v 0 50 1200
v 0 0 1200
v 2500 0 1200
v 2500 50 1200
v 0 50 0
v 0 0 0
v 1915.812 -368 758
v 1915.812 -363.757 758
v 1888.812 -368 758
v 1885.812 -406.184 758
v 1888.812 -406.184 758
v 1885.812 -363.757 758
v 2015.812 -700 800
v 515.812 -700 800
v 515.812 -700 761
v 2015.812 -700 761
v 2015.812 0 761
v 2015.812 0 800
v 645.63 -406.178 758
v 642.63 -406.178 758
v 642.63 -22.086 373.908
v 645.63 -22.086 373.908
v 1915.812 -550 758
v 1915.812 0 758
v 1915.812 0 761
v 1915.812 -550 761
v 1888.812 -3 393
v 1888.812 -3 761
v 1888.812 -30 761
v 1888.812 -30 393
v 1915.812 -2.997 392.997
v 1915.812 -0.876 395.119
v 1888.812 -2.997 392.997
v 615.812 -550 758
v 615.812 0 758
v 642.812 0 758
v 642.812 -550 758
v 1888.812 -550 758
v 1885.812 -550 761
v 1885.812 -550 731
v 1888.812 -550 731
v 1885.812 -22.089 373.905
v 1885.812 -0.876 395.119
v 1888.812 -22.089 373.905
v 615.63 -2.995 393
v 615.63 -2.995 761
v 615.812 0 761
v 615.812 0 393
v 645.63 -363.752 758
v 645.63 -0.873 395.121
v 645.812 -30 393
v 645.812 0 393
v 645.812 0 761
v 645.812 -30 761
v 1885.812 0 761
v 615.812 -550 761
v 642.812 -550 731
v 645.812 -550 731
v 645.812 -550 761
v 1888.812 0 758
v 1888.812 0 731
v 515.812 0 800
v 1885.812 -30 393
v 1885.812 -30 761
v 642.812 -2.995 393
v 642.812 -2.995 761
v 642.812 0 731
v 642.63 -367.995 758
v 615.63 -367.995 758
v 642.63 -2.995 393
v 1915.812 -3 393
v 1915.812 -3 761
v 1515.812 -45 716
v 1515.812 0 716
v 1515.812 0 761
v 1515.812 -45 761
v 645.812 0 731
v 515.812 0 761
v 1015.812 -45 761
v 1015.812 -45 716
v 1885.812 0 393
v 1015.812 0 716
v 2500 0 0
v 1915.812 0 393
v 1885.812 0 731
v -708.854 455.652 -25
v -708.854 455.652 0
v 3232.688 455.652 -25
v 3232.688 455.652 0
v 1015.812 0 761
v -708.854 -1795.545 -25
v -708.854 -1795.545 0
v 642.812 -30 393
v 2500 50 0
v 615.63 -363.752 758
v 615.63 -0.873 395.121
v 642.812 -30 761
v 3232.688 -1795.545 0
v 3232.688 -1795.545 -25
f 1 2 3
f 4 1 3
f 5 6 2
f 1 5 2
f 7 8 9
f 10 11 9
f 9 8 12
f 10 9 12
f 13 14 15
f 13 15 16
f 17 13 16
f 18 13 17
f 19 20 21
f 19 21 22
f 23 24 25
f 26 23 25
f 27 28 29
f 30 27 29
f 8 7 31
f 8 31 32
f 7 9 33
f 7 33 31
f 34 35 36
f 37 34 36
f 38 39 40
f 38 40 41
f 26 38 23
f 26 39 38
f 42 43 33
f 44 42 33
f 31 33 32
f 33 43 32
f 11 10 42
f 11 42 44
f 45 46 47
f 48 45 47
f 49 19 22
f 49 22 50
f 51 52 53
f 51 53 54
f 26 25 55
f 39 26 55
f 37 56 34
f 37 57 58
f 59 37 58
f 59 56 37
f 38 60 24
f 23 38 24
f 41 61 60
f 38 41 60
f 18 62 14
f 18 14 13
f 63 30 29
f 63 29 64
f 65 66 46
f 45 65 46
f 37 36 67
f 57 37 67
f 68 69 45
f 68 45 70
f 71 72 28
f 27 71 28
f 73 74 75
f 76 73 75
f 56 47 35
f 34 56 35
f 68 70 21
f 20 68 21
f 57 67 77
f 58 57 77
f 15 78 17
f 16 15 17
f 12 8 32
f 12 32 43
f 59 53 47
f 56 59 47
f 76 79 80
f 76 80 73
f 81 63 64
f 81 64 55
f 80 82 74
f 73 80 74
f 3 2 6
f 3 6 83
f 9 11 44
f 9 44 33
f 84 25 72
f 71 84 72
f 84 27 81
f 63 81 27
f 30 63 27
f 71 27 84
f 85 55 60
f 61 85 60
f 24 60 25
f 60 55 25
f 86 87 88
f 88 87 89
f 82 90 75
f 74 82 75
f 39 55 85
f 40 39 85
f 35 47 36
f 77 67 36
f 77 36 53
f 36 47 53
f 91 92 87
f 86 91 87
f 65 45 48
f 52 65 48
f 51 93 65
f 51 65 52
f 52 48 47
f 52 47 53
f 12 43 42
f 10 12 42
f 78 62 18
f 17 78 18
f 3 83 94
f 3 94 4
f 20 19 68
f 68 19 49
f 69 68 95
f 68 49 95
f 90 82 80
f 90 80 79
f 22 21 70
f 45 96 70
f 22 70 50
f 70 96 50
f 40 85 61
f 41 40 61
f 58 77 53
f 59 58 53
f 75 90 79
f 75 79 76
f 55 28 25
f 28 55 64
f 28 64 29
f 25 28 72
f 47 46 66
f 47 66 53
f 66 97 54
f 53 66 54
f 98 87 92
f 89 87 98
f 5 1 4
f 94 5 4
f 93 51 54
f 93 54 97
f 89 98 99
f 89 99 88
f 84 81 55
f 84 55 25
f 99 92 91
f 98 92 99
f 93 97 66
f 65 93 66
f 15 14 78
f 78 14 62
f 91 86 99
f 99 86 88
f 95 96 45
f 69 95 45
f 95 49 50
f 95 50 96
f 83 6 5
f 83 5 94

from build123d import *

# Parameters (mm, degrees)
F0_W      = 2500
F0_H      = 1200
F1_DEPTH  = 50
F2_W      = 3941.5423870087
F2_H      = 2251.1970996857
F3_DEPTH  = 25
F5_W      = 1500
F5_H      = 700
F6_DEPTH  = 39
F7_W      = 500
F7_H      = 45
F8_DEPTH  = 45
F10_DEPTH = 550
F12_DEPTH = 368
F15_REACH = 1880.5875140627


with BuildPart() as f1:
    # F0 (on Front) → F1 (new body)
    with BuildSketch(Plane.XZ):
        with Locations((1250, 600)):
            Rectangle(F0_W, F0_H)
    extrude(amount=-F1_DEPTH)


with BuildPart() as f3:
    # F2 (on Top) → F3 (new body)
    with BuildSketch(Plane.XY):
        with Locations((1261.9167566299, -669.9469089508)):
            Rectangle(F2_W, F2_H)
    extrude(amount=-F3_DEPTH)


with BuildPart() as f6:
    # F5 (on offset) → F6 (new body)
    with BuildSketch(Plane.XY.offset(800)):
        with Locations((1265.8117413521, -350)):
            Rectangle(F5_W, F5_H)
    extrude(amount=-F6_DEPTH)


with BuildPart() as f8:
    # F7 (on face) → F8 (new body)
    with BuildSketch(Plane.XZ):
        with Locations((1265.8117413521, 738.5)):
            Rectangle(F7_W, F7_H)
    extrude(amount=F8_DEPTH)


with BuildPart() as f10:
    # F9 (on face) → F10 (new body)
    with BuildSketch(Plane.XZ):
        Polygon((645.8117413521, 761), (615.8117413521, 761), (615.8117413521, 758), (642.8117413521, 758), (642.8117413521, 731), (645.8117413521, 731), align=None)
    extrude(amount=F10_DEPTH)


with BuildPart() as f10b:
    # F9 (on face) → F10, piece 2 (new body)
    with BuildSketch(Plane.XZ):
        Polygon((1915.8117413521, 758), (1915.8117413521, 761), (1885.8117413521, 761), (1885.8117413521, 731), (1888.8117413521, 731), (1888.8117413521, 758), align=None)
    extrude(amount=F10_DEPTH)


with BuildPart() as f12:
    # F11 (on face) → F12 (new body)
    with BuildSketch(Plane(origin=(0, 0, 761), x_dir=(1, 0, 0), z_dir=(0, 0, -1))):
        Polygon((615.6302545255, 2.9945053902), (615.8117413521, 0), (645.8117413521, 0), (645.8117413521, 30), (642.8117413521, 30), (642.8117413521, 2.9945053902), align=None)
    extrude(amount=F12_DEPTH)


with BuildPart() as f12b:
    # F11 (on face) → F12, piece 2 (new body)
    with BuildSketch(Plane(origin=(0, 0, 761), x_dir=(1, 0, 0), z_dir=(0, 0, -1))):
        Polygon((1888.8117413521, 30), (1885.8117413521, 30), (1885.8117413521, 0), (1915.8117413521, 0), (1915.8117413521, 3), (1888.8117413521, 3), align=None)
    extrude(amount=F12_DEPTH)


with BuildPart() as f15:
    f15_end = Plane(origin=(629.3117413521, -275, 758), x_dir=(-1, 0, 0), z_dir=(0, 0, -1))
    # F14 (on face) → F15 (new body, up to a plane its end follows)
    with BuildSketch(Plane(origin=(0, -197.9972526951, 197.9972526951), x_dir=(1, 0, 0), z_dir=(0, -0.7071067812, 0.7071067812))):
        Polygon((642.6302545255, 248.7755299386), (645.6302545255, 248.7755299386), (645.6302545255, 278.7755299386), (615.6302545255, 278.7755299386), (615.6302545255, 275.7755299386), (642.6302545255, 275.7755299386), align=None)
    f15_long = extrude(amount=F15_REACH, mode=Mode.PRIVATE)
    add(split(f15_long, bisect_by=f15_end, keep=Keep.TOP, mode=Mode.PRIVATE))


with BuildPart() as f15b:
    f15_2_end = Plane(origin=(629.3117413521, -275, 758), x_dir=(-1, 0, 0), z_dir=(0, 0, -1))
    # F14 (on face) → F15, piece 2 (new body, up to a plane its end follows)
    with BuildSketch(Plane(origin=(0, -197.9972526951, 197.9972526951), x_dir=(1, 0, 0), z_dir=(0, -0.7071067812, 0.7071067812))):
        Polygon((1915.8117413521, 275.7716446628), (1915.8117413521, 278.7716446628), (1885.8117413521, 278.7716446628), (1885.8117413521, 248.7716446628), (1888.8117413521, 248.7716446628), (1888.8117413521, 275.7716446628), align=None)
    f15_2_long = extrude(amount=F15_REACH, mode=Mode.PRIVATE)
    add(split(f15_2_long, bisect_by=f15_2_end, keep=Keep.TOP, mode=Mode.PRIVATE))


solid = Compound([f1.part, f3.part, f6.part, f8.part, f10.part, f10b.part, f12.part, f12b.part, f15.part, f15b.part])
